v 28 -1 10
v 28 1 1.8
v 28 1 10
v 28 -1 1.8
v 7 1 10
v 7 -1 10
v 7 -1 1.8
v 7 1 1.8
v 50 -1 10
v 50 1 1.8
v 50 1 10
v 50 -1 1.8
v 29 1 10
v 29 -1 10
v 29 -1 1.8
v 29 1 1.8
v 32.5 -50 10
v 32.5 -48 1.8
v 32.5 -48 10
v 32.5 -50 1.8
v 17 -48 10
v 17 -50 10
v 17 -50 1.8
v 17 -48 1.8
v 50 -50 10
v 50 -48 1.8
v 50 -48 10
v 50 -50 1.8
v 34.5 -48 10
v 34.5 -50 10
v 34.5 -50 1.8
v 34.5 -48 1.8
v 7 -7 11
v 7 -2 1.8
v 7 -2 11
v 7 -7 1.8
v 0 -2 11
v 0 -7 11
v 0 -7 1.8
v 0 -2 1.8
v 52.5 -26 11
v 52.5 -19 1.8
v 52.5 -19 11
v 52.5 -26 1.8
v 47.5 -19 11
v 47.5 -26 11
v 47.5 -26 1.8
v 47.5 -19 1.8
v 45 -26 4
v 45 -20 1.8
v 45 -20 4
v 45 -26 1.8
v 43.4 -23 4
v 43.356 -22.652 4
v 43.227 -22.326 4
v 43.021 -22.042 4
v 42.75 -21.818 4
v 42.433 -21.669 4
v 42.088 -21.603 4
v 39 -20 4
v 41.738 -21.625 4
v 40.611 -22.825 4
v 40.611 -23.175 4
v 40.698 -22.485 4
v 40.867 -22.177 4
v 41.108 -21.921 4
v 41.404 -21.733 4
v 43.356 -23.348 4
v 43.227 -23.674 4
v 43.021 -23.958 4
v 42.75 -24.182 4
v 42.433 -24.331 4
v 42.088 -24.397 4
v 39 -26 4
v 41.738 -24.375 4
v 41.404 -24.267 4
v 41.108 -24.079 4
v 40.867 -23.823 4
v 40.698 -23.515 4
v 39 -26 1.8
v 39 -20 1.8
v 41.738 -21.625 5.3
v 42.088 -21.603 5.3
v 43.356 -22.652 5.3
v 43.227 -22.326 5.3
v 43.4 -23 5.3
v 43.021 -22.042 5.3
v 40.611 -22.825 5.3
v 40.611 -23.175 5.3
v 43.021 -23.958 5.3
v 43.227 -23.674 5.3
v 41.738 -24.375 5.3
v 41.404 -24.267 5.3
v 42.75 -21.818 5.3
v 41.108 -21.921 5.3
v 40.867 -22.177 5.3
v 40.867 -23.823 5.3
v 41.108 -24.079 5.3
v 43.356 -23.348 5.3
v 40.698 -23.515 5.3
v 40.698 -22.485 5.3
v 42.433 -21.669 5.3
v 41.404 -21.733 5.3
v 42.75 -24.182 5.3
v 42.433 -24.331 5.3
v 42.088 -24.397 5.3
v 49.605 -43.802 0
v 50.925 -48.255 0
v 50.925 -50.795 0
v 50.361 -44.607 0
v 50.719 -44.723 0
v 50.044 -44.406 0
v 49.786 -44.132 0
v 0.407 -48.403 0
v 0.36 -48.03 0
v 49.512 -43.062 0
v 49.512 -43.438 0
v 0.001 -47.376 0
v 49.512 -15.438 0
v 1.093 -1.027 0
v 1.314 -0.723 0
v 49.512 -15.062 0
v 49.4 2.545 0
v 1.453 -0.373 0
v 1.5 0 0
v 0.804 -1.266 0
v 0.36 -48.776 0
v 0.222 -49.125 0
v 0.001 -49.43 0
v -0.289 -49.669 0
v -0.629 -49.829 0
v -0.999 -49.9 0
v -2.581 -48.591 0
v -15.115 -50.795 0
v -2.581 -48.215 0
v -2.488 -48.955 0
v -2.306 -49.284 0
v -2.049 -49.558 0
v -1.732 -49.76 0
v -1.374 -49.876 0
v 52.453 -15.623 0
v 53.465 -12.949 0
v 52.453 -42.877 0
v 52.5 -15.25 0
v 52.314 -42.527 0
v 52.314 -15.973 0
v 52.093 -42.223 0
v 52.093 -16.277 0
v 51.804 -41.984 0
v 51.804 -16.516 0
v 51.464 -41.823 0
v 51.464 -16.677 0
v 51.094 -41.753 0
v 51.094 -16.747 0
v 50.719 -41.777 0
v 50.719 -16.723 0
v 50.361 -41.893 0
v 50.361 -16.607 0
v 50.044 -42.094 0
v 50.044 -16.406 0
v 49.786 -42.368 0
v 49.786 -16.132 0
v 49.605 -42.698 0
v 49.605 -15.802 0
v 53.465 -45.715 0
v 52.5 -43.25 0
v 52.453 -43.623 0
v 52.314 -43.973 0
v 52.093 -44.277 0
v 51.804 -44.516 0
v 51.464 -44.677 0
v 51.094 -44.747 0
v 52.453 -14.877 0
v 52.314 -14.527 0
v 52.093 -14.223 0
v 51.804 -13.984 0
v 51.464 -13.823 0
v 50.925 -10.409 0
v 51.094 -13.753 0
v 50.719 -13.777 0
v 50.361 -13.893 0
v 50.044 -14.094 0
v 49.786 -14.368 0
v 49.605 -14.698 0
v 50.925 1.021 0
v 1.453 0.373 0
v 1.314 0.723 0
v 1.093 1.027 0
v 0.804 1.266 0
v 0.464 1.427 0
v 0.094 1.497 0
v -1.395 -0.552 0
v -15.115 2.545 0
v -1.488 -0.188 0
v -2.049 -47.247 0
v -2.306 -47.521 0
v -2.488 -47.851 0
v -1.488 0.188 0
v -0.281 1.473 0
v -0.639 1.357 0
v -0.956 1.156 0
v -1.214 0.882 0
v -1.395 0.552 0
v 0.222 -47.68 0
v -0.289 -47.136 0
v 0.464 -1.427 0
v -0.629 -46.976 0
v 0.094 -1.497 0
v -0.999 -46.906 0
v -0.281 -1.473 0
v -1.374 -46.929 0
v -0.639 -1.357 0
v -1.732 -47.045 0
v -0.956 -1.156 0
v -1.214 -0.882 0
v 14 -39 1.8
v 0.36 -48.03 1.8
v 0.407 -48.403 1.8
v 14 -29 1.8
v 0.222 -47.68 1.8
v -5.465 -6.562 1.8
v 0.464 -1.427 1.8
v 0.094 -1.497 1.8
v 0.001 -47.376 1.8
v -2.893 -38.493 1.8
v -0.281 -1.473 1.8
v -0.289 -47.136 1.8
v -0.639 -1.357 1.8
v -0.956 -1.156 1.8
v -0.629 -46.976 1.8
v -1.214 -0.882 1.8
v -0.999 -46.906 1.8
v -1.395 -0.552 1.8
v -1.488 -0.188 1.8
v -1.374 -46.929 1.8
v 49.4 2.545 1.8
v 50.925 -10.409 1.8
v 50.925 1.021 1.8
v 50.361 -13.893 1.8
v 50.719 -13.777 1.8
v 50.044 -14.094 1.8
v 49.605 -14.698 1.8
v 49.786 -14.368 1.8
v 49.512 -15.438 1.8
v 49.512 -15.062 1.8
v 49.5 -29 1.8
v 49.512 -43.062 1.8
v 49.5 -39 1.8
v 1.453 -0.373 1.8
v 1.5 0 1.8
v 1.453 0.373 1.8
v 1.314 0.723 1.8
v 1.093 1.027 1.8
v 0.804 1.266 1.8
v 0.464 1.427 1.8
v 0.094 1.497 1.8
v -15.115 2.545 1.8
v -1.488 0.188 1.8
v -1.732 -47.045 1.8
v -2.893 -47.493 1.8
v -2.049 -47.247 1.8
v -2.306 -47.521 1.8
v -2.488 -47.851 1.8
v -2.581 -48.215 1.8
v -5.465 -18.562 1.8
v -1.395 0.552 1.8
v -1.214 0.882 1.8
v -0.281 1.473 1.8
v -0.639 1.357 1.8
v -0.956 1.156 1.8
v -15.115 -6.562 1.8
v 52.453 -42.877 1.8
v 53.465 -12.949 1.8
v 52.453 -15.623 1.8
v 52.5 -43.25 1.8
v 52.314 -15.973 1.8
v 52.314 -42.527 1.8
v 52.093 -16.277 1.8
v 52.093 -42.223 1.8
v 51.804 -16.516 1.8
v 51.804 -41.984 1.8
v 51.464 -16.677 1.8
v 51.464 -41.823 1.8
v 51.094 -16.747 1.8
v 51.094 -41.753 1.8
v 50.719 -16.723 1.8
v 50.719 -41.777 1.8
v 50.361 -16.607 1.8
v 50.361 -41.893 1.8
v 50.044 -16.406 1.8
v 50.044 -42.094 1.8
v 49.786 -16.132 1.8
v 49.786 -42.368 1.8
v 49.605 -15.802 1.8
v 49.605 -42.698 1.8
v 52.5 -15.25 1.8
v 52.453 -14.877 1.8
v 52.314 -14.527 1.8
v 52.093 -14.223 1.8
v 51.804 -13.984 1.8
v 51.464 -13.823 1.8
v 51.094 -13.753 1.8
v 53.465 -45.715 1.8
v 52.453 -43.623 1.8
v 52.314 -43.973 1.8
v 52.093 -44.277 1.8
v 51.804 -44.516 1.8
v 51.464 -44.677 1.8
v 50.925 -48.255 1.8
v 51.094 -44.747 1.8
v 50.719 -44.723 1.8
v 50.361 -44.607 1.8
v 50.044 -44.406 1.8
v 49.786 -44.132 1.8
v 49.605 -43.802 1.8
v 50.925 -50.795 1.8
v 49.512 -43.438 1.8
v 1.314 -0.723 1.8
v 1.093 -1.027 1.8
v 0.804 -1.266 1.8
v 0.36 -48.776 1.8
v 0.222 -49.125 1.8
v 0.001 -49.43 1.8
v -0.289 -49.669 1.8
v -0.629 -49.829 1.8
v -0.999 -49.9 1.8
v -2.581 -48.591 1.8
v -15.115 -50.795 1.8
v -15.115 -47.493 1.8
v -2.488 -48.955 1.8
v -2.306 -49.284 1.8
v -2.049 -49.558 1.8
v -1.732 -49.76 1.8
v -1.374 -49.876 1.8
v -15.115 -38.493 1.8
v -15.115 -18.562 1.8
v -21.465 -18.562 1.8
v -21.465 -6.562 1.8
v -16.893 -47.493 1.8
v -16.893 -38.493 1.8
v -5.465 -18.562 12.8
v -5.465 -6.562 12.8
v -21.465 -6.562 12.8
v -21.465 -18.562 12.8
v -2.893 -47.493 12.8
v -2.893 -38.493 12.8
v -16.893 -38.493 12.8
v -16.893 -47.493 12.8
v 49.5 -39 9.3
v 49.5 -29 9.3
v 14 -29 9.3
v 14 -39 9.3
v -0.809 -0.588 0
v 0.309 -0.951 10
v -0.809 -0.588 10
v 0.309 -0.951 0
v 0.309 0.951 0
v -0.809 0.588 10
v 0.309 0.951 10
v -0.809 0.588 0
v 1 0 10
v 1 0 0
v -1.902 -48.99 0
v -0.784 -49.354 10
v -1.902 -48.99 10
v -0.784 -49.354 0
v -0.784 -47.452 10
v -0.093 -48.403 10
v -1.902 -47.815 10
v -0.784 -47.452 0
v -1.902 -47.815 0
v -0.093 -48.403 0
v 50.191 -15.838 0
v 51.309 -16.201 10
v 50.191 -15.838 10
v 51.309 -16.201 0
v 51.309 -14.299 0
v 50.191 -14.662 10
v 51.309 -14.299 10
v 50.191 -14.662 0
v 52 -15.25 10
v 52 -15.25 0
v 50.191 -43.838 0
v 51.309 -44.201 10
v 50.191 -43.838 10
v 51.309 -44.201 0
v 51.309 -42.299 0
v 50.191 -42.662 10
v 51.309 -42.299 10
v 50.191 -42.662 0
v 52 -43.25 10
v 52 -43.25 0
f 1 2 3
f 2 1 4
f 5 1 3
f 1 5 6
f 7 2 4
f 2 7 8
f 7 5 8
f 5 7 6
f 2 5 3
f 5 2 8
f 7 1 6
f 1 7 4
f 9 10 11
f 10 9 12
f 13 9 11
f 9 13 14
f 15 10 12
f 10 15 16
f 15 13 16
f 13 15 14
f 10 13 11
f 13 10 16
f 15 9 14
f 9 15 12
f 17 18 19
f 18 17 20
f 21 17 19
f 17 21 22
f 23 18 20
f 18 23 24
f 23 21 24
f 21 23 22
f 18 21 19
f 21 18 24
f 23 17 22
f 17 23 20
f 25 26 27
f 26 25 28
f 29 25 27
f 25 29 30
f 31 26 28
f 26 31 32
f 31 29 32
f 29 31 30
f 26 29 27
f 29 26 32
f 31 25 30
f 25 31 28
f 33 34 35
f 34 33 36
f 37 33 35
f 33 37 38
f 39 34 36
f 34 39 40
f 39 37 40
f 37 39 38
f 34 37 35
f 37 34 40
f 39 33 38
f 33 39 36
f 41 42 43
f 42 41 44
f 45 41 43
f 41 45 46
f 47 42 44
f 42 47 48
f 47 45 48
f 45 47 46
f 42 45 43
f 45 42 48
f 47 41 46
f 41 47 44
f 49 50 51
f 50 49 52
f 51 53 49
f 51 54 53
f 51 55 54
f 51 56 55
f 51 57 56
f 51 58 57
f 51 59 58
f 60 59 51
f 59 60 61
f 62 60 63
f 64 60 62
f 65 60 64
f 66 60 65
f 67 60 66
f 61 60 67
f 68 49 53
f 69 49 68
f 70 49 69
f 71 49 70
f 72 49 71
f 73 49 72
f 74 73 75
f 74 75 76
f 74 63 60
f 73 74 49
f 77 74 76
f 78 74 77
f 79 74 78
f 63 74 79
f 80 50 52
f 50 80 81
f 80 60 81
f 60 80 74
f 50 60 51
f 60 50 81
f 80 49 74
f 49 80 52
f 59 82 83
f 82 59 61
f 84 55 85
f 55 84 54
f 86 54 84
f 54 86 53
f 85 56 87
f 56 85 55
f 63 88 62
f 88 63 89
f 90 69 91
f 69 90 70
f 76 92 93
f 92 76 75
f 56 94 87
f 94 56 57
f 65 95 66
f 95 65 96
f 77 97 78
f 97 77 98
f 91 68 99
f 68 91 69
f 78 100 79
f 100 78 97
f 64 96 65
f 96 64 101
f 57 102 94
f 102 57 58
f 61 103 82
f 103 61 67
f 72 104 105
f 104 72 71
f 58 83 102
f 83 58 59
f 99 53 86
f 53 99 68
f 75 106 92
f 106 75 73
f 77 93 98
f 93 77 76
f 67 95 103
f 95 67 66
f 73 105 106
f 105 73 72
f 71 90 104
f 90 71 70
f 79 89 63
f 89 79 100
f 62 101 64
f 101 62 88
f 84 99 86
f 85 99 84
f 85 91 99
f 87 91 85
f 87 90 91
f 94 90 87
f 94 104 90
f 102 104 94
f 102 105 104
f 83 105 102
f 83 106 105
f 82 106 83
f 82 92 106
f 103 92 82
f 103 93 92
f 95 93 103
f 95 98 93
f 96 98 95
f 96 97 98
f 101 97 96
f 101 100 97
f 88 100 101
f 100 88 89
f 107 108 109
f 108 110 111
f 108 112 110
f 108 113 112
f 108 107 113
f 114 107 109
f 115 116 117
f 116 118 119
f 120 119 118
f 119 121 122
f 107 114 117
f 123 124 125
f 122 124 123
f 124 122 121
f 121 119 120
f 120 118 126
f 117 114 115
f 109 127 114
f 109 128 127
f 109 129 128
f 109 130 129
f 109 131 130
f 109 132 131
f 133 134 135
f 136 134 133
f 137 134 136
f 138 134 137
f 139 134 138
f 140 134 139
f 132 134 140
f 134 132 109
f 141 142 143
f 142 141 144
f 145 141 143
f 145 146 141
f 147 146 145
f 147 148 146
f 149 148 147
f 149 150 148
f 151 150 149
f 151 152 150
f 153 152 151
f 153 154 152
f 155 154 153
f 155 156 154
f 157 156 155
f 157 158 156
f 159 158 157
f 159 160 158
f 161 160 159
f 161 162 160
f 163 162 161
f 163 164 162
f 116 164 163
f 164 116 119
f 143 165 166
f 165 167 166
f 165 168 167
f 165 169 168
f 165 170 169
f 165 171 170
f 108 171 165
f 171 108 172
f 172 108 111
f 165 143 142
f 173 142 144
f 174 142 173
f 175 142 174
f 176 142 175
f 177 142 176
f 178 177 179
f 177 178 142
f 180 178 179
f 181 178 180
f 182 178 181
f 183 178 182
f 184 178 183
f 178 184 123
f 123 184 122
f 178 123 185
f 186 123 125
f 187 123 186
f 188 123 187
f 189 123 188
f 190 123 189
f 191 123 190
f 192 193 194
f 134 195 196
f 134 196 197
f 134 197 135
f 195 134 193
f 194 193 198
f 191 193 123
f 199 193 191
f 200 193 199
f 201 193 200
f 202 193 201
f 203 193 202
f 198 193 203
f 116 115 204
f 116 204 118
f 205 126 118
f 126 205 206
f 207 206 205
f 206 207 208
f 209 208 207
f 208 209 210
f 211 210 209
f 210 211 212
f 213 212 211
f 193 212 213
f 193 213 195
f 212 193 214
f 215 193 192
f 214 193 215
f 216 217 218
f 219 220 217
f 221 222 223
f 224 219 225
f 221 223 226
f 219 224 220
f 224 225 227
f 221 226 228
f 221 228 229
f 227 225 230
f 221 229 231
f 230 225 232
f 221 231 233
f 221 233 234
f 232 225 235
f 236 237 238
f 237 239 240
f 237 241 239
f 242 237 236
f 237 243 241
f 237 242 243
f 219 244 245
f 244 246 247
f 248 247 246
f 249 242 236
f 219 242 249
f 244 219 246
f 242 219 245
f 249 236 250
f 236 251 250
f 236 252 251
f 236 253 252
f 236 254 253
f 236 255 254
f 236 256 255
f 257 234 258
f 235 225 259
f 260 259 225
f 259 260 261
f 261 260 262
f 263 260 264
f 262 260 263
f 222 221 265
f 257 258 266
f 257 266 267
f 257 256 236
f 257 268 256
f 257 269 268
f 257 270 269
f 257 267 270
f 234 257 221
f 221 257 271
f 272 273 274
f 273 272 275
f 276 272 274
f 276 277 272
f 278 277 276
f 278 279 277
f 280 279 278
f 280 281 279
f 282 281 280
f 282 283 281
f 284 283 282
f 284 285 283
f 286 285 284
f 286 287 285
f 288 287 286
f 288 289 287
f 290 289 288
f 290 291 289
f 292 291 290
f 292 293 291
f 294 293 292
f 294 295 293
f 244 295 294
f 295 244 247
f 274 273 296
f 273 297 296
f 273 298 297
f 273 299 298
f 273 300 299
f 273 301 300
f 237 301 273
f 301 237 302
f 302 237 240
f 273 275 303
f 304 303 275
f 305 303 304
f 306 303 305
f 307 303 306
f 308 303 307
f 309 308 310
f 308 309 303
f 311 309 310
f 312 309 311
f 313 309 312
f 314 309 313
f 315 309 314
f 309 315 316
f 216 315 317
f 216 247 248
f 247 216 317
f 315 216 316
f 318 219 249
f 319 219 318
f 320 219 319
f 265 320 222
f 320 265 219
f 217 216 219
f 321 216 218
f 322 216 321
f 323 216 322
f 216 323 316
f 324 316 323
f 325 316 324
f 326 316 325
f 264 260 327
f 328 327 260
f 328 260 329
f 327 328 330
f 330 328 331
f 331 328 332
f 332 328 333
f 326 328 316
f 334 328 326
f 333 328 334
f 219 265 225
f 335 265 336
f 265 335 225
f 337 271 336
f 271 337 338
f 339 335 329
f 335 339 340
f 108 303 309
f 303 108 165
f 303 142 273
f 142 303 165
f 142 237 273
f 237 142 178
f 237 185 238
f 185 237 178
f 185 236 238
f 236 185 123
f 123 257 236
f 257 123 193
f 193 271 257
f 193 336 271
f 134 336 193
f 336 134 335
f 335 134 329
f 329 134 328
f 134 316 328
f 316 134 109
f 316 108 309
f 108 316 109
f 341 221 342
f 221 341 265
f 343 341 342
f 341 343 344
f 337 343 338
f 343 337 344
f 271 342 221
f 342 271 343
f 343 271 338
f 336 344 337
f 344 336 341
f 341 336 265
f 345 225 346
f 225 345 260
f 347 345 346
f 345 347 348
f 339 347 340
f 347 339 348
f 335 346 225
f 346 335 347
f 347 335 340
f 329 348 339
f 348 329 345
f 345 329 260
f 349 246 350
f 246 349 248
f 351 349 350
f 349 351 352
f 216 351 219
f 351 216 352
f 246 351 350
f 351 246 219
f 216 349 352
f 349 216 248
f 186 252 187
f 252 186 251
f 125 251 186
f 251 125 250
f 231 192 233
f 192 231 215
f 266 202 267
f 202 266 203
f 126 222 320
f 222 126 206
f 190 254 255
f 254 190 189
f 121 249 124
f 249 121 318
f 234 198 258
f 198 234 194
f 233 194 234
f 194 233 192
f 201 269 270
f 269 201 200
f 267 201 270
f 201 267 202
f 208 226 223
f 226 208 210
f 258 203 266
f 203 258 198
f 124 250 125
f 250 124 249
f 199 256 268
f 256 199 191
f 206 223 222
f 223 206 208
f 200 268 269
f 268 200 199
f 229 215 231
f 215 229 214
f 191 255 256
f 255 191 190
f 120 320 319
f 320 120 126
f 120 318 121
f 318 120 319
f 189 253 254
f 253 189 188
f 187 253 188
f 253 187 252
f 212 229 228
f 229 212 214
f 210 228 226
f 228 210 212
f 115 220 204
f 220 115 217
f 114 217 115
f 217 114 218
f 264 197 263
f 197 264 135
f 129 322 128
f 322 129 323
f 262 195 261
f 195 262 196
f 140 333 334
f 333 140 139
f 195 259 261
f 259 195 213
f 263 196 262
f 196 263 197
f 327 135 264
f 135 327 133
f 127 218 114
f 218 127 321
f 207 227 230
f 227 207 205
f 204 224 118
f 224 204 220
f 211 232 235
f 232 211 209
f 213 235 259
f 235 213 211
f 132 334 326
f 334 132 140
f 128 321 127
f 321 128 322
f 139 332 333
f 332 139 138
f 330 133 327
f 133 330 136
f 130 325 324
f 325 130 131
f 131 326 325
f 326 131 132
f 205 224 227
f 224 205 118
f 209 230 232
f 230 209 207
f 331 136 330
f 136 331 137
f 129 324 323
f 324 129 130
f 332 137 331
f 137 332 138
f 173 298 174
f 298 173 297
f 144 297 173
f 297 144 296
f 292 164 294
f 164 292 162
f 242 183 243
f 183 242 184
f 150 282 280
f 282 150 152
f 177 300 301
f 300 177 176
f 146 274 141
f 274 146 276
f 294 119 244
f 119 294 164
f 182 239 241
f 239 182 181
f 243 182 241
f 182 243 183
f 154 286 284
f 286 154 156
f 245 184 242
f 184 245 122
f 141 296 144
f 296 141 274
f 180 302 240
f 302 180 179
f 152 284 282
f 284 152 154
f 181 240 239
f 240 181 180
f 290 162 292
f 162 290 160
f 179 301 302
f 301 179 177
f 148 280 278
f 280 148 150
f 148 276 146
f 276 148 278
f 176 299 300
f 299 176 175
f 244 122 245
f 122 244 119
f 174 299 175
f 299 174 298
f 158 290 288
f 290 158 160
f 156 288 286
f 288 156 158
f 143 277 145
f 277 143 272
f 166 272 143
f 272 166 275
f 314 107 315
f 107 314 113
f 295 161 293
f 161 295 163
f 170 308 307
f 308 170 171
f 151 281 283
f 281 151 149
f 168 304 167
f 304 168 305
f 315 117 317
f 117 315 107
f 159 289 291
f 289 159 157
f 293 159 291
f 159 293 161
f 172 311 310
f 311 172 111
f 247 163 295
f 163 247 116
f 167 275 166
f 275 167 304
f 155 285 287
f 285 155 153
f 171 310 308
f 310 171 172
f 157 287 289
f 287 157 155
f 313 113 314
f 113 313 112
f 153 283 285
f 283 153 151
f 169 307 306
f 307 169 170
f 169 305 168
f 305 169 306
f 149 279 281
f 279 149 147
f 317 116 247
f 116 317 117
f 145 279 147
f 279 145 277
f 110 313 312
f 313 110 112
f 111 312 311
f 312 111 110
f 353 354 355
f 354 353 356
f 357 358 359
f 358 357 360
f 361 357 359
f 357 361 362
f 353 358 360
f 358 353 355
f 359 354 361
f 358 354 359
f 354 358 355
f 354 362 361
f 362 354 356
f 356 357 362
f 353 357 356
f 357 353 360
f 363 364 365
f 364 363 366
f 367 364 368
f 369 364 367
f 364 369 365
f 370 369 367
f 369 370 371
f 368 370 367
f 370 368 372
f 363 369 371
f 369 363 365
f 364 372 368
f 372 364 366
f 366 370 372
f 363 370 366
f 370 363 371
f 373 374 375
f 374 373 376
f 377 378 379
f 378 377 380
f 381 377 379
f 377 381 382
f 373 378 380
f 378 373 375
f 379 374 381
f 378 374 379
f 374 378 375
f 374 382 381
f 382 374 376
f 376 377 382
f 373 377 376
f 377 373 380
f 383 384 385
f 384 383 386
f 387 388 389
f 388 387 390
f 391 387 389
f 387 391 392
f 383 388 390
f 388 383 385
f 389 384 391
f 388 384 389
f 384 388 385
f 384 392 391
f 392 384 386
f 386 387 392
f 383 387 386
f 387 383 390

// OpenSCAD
/* arduino.scad
 *
 * Copyright (C) Jestin Stoffel 2012
 *
 * Added placement module for mounting holes : olivier Boesch 2022
 *
 * This library is free software; you can redistribute it and/or
 * modify it under the terms of the GNU Library General Public
 * License as published by the Free Software Foundation; either
 * version 2 of the License, or (at your option) any later version.
 *
 * This library is distributed in the hope that it will be useful,
 * but WITHOUT ANY WARRANTY; without even the implied warranty of
 * MERCHANTABILITY or FITNESS FOR A PARTICULAR PURPOSE.  See the GNU
 * Library General Public License for more details.
 *
 * You should have received a copy of the GNU Library General Public
 * License along with this library; if not, write to the Free
 * Software Foundation, Inc., 675 Mass Ave, Cambridge, MA 02139, USA.
 */

// Throughout this entire model, (0,0) is the top left mounting hole (nearest  the USB port)

// thickness of the PCB
board_height = 1.8;

// solid_holes - specifies if mounting holes should be added to or subtracted from the model
// combined_headers - specifies if space should be left between adjacent female headers, or if they should be rendered as a single header
// extend_ports - extends the USB and power ports by a centimeter, so that holes are more easily made when a model is used as a negative

Arduino();
place_on_MountingHoles() cylinder(d=2, h=10);

module Arduino(solid_holes, combined_headers, extend_ports)
{
	echo(str("solid_holes: ", solid_holes));
	echo(str("combined_headers: ", combined_headers));
	echo(str("extend_ports: ", extend_ports));

	if (solid_holes == 1)
	{
		echo("solid holes");
		union()
		{
			Board();
			USB(extend_ports);
			PowerPlug(extend_ports);
			FemaleHeaders(combined_headers);
			MaleHeaders();
			ResetButton();
			ATMega();
			MountingHoles();
		}
	}
	else
	{
		echo("regular holes");
		difference()
		{
			union()
			{
				Board();
				USB(extend_ports);
				PowerPlug(extend_ports);
				FemaleHeaders(combined_headers);
				MaleHeaders();
				ResetButton();
				ATMega();
			}
			MountingHoles();
		}
	}
}

module ResetButton()
{
	translate([39, -26, board_height])
	{
		color([0.8, 0.8, 0.8])
		cube([6, 6, 2.2]);
		
		color([0.6, 0.4, 0.2])
		translate([3, 3, 0]) cylinder(r=1.4, h=3.5, $fn=25);
	}
}

module MaleHeaders()
{
	color([0.6, 0.6, 0.6])
	translate([0, 0, board_height])
	{
		translate([0, -7, 0]) cube([7, 5, 9.2]);
		translate([47.5, -26, 0]) cube([5, 7, 9.2]);
	}
}

module ATMega()
{
	color([0.3, 0.3, 0.3])
	translate([14, -39, board_height])
	{
		cube([35.5, 10, 7.5]);
	}
}

module FemaleHeaders(combined)
{
	color([0.3, 0.3, 0.3])
	translate([0, 0, board_height])
	{
		translate([0, -1, 0])
		{
			translate([7, 0, 0])
			{
				if(combined == 1)
				{
					cube([43, 2, 8.2]);
				}
				else
				{
					cube([21, 2, 8.2]);
					translate([22, 0, 0]) cube([21, 2, 8.2]);
				}
			}
		}

		translate([0, -50, 0])
		{
			translate([17, 0, 0])
			{
				if(combined == 1)
				{
					cube([33, 2, 8.2]);
				}
				else
				{
					cube([15.5, 2, 8.2]);
					translate([17.5, 0, 0]) cube([15.5, 2, 8.2]);
				}
			}
		}
	}
}

module PowerPlug(extended)
{
	if(extended == 1)
	{
		translate([-26.893, -47.4929962, board_height])
		color([0.3, 0.3, 0.3])
		cube([24, 9, 11]);
	}
	else
	{
		translate([-16.893, -47.4929962, board_height])
		color([0.3, 0.3, 0.3])
		cube([14, 9, 11]);
	}
}

module USB(extended)
{
	if(extended == 1)
	{
		translate([-31.465, -18.5623962, board_height])
		color([0.8, 0.8, 0.8])
		cube([26, 12, 11]);
	}
	else
	{
		translate([-21.465, -18.5623962, board_height])
		color([0.8, 0.8, 0.8])
		cube([16, 12, 11]);
	}
}


module Board()
{
	color([0, 0.6, 0.8])
	linear_extrude(height = board_height, convexity = 10, twist = 0)
	{
		polygon( points = [ [-15.115, 2.545],
						[49.4, 2.545],
						[50.925, 1.021],
						[50.925, -10.409],
						[53.465, -12.949],
						[53.465, -45.715],
						[50.925, -48.255],
						[50.925, -50.795],
						[-15.115, -50.795] ],
				paths = [[0, 1, 2, 3, 4, 5, 6, 7, 8]],
				convexity = 10);
	}
}

module MountingHoles()
{
	translate([0, 0, -10])
	{
		ArduinoHole(25);
		translate([-1.0929112, -48.4026972, 0]) ArduinoHole(25);
		translate([51, -15.25, 0]) ArduinoHole(25);
		translate([51, -43.25, 0]) ArduinoHole(25);
	}
}

module place_on_MountingHoles()
{
	children();
	translate([-1.0929112, -48.4026972, 0]) children();;
	translate([51, -15.25, 0]) children();
	translate([51, -43.25, 0]) children();
}

module ArduinoHole(length)
{
	color([0.7, 0.7, 0.7])
	cylinder(r=1.5, h=length, $fn=25);
}
